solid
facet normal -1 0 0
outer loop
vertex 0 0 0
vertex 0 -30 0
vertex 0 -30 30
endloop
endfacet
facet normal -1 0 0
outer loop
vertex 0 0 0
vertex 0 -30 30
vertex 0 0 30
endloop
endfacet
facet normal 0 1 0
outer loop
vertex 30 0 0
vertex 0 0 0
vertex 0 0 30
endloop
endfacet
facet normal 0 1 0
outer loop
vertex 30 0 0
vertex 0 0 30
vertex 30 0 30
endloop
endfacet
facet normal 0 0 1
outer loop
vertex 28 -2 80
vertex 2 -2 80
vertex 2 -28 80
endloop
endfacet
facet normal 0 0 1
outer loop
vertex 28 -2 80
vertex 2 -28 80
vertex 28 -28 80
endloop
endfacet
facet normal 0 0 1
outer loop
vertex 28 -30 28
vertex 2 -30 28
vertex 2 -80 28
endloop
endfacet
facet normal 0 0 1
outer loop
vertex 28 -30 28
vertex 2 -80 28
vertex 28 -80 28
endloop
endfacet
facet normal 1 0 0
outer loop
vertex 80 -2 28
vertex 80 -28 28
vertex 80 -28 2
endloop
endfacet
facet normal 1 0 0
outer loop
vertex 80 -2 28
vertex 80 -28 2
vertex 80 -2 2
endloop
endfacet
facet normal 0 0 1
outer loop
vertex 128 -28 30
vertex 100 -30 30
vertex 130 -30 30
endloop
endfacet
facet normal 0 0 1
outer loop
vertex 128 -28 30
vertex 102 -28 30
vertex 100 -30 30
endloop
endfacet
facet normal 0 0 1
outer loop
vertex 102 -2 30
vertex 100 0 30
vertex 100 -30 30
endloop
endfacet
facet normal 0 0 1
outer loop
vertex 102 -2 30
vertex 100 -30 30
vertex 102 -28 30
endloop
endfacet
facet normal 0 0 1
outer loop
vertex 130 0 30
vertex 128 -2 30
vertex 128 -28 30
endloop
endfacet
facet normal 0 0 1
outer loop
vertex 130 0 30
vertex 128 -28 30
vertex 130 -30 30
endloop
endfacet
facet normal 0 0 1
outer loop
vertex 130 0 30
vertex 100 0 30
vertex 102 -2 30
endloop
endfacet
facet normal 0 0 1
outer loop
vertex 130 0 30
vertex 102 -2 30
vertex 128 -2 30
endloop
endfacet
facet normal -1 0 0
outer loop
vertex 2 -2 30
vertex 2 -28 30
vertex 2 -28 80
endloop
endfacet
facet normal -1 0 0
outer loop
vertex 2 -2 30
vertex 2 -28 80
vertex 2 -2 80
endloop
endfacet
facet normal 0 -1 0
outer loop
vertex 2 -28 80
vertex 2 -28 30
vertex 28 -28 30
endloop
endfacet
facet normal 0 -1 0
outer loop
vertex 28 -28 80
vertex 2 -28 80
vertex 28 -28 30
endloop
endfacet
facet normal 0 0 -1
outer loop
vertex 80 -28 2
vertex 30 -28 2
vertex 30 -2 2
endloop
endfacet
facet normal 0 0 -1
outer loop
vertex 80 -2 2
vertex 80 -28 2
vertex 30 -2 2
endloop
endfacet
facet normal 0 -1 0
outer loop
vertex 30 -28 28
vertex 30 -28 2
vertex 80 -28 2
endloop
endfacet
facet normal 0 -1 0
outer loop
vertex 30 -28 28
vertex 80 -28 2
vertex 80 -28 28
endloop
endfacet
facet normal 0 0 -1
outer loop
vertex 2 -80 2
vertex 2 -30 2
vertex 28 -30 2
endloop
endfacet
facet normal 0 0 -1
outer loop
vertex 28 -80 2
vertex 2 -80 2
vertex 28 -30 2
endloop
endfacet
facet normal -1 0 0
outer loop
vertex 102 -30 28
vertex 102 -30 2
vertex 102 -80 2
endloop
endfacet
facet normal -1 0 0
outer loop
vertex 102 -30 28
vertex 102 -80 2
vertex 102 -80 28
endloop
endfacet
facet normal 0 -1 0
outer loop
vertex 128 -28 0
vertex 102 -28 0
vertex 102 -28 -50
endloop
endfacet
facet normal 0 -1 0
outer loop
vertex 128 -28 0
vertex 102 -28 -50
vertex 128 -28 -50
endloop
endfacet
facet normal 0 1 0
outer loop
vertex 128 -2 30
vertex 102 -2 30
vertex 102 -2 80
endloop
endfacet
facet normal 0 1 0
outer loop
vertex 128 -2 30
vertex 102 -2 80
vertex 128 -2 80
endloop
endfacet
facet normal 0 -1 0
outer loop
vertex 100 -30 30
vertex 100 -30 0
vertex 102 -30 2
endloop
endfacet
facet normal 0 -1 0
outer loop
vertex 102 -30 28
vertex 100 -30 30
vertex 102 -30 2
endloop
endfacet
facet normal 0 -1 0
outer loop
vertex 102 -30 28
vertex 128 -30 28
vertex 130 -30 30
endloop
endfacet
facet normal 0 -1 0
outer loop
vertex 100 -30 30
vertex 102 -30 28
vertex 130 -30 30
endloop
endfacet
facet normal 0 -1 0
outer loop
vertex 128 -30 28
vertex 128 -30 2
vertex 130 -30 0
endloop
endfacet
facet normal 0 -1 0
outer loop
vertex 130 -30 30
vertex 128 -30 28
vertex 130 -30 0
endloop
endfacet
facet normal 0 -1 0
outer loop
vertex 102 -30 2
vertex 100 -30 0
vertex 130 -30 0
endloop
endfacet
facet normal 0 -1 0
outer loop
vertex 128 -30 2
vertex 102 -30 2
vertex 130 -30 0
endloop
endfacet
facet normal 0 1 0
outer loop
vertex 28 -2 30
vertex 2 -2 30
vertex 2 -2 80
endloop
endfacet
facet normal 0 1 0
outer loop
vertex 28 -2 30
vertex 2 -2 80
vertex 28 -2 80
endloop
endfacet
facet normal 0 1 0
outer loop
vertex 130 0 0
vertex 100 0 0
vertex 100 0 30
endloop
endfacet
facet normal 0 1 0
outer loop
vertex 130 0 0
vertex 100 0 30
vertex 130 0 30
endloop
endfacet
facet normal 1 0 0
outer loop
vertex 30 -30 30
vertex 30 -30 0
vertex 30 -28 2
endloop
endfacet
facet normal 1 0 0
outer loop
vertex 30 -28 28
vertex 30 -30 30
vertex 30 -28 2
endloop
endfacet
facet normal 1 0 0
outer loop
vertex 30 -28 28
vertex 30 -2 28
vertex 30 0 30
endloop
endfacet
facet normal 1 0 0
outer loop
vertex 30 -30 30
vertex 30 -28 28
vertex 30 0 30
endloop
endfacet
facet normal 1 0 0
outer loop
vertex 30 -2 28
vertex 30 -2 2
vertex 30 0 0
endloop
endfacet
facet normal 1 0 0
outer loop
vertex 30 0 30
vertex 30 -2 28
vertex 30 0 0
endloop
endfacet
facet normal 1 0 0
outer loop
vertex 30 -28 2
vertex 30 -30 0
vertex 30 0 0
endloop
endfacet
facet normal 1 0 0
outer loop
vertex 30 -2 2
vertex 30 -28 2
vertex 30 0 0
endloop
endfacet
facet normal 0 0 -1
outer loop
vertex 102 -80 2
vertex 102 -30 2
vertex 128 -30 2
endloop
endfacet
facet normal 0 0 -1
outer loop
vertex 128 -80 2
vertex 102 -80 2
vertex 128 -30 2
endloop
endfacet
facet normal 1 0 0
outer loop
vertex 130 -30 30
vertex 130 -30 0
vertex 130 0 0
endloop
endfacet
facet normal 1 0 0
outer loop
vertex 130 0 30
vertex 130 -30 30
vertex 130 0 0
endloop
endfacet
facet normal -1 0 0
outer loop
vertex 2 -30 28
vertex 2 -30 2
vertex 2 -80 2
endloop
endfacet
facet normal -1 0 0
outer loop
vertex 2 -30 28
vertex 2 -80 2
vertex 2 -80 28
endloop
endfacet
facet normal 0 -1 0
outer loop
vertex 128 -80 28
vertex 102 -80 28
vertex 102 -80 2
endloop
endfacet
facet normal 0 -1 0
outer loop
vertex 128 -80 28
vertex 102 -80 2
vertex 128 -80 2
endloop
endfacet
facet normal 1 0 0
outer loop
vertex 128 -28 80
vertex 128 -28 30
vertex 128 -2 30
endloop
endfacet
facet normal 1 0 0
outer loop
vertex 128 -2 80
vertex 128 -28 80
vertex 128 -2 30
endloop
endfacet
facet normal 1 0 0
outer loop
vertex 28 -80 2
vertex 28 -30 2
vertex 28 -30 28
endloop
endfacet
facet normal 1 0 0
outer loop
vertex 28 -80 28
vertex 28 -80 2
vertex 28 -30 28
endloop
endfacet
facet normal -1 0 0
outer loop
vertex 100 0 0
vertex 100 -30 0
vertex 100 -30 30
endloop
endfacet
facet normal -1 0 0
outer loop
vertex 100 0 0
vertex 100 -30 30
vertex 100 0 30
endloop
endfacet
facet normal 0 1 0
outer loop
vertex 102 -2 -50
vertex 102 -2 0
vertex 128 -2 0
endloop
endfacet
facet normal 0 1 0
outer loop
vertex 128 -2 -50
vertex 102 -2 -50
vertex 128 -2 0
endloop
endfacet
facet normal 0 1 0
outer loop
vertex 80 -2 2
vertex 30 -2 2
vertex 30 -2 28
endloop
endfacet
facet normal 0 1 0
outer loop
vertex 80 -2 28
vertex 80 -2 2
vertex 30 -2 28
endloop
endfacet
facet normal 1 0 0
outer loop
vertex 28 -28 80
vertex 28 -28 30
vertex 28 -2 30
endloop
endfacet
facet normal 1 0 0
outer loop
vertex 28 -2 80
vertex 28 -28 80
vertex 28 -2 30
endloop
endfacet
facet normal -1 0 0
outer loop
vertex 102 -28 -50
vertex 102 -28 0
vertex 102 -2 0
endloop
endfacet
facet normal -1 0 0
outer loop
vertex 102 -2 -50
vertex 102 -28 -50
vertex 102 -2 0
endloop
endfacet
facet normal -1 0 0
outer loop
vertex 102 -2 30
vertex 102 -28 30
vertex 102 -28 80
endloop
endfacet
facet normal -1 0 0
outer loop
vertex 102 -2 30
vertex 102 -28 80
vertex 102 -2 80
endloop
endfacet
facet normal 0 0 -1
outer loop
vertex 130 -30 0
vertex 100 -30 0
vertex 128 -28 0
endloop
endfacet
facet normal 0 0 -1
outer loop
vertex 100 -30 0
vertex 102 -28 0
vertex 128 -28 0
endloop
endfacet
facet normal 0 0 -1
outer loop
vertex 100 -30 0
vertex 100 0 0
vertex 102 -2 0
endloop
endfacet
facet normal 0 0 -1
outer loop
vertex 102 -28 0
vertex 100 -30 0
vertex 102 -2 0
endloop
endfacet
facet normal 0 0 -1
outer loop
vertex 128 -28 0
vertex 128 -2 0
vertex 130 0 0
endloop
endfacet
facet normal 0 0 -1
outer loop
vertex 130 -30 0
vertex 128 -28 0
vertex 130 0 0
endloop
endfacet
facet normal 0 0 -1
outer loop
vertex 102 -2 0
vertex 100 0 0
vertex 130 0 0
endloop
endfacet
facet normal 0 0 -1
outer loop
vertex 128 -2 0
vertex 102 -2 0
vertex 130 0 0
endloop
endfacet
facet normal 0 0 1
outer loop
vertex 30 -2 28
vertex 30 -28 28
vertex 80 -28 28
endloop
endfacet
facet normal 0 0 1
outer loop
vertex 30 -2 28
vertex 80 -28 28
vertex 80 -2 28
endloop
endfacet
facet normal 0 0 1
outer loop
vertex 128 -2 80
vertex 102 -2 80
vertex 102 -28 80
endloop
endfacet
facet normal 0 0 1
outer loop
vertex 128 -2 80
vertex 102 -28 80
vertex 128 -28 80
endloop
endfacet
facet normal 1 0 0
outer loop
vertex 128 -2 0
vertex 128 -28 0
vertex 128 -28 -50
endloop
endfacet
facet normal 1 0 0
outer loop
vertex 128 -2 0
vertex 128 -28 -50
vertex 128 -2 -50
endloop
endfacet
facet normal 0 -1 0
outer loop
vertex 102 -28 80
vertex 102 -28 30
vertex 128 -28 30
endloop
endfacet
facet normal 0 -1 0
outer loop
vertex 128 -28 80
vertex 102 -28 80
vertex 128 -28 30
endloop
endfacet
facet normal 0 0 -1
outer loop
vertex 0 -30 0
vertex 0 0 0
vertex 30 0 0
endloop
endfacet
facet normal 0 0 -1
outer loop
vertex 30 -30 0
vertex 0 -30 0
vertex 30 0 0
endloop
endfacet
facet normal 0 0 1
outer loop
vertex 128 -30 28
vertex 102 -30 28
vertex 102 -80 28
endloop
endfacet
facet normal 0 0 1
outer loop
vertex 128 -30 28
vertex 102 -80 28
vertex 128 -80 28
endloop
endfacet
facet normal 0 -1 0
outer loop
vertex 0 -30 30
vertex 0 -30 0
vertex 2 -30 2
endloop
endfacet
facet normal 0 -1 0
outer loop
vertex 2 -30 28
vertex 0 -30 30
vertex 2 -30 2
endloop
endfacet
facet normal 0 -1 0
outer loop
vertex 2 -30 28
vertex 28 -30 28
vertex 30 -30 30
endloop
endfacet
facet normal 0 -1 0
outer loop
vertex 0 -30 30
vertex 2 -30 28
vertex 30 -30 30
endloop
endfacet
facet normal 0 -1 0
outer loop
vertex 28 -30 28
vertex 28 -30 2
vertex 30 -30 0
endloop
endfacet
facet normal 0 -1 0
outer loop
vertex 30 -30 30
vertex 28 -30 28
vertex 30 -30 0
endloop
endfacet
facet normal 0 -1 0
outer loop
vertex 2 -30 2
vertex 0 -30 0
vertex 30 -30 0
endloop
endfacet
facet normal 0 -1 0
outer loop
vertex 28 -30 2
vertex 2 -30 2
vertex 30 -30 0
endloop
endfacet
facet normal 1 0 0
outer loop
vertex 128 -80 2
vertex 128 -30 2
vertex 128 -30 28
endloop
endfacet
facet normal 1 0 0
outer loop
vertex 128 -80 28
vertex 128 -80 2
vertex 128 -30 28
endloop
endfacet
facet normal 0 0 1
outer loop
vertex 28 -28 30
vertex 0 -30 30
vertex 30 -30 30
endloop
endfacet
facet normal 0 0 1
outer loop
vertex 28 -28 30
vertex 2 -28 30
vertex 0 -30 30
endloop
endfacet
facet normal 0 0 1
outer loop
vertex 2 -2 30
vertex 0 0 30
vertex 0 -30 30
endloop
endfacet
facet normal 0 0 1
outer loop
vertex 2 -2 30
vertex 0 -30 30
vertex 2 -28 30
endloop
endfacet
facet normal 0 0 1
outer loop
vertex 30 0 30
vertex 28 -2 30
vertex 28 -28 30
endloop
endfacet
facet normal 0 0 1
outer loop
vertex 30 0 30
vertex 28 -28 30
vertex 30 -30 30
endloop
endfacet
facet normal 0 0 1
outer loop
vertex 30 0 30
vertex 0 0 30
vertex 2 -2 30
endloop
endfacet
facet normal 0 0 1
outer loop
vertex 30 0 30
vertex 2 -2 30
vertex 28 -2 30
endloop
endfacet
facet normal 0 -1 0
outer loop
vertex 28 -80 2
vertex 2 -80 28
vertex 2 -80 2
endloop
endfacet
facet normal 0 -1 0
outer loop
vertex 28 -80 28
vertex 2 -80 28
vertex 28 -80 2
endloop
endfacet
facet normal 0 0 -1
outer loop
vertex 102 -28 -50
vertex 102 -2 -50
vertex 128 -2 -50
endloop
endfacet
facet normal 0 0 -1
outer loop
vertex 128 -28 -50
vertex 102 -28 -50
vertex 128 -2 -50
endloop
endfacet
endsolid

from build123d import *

# Parameters (mm, degrees)
F2_W      = 30
F2_H      = 30
F3_DEPTH  = 30
F4_W      = 26
F4_H      = 26
F5_DEPTH  = 50
F6_W      = 26
F6_H      = 26
F7_DEPTH  = 50
F8_W      = 26
F8_H      = 26
F9_DEPTH  = 50
F2_W_2    = 26
F2_H_2    = 26
F10_DEPTH = 30
F11_W     = 26
F11_H     = 26
F12_DEPTH = 50
F13_W     = 26
F13_H     = 26
F14_DEPTH = 50
F15_DEPTH = 50


with BuildPart() as f3:
    # F2 (on Top) → F3 (new body)
    with BuildSketch(Plane.XY):
        with Locations((15, -15)):
            Rectangle(F2_W, F2_H)
    extrude(amount=F3_DEPTH)

    # F4 (on face) → F5 (join)
    with BuildSketch(Plane.XZ.offset(30)):
        with Locations((15, 15)):
            Rectangle(F4_W, F4_H)
    extrude(amount=F5_DEPTH)

    # F6 (on face) → F7 (join)
    with BuildSketch(Plane.YZ.offset(30)):
        with Locations((-15, 15)):
            Rectangle(F6_W, F6_H)
    extrude(amount=F7_DEPTH)

    # F8 (on face) → F9 (join)
    with BuildSketch(Plane.XY.offset(30)):
        with Locations((15, -15)):
            Rectangle(F8_W, F8_H)
    extrude(amount=F9_DEPTH)


with BuildPart() as f10:
    # F2 (on Top) → F10 (new body)
    with BuildSketch(Plane.XY):
        with Locations((115, -15)):
            Rectangle(F2_W, F2_H)
        with Locations((115, -15)):
            Rectangle(F2_W_2, F2_H_2, mode=Mode.SUBTRACT)
        with Locations((115, -15)):
            Rectangle(F2_W_2, F2_H_2)
    extrude(amount=F10_DEPTH)

    # F11 (on face) → F12 (join)
    with BuildSketch(Plane.XY.offset(30)):
        with Locations((115, -15)):
            Rectangle(F11_W, F11_H)
    extrude(amount=F12_DEPTH)

    # F13 (on face) → F14 (join)
    with BuildSketch(Plane.XZ.offset(30)):
        with Locations((115, 15)):
            Rectangle(F13_W, F13_H)
    extrude(amount=F14_DEPTH)

    # F2 (on Top) → F15 (join)
    with BuildSketch(Plane.XY):
        with Locations((115, -15)):
            Rectangle(F2_W_2, F2_H_2)
    extrude(amount=-F15_DEPTH)


solid = Compound([f3.part, f10.part])
